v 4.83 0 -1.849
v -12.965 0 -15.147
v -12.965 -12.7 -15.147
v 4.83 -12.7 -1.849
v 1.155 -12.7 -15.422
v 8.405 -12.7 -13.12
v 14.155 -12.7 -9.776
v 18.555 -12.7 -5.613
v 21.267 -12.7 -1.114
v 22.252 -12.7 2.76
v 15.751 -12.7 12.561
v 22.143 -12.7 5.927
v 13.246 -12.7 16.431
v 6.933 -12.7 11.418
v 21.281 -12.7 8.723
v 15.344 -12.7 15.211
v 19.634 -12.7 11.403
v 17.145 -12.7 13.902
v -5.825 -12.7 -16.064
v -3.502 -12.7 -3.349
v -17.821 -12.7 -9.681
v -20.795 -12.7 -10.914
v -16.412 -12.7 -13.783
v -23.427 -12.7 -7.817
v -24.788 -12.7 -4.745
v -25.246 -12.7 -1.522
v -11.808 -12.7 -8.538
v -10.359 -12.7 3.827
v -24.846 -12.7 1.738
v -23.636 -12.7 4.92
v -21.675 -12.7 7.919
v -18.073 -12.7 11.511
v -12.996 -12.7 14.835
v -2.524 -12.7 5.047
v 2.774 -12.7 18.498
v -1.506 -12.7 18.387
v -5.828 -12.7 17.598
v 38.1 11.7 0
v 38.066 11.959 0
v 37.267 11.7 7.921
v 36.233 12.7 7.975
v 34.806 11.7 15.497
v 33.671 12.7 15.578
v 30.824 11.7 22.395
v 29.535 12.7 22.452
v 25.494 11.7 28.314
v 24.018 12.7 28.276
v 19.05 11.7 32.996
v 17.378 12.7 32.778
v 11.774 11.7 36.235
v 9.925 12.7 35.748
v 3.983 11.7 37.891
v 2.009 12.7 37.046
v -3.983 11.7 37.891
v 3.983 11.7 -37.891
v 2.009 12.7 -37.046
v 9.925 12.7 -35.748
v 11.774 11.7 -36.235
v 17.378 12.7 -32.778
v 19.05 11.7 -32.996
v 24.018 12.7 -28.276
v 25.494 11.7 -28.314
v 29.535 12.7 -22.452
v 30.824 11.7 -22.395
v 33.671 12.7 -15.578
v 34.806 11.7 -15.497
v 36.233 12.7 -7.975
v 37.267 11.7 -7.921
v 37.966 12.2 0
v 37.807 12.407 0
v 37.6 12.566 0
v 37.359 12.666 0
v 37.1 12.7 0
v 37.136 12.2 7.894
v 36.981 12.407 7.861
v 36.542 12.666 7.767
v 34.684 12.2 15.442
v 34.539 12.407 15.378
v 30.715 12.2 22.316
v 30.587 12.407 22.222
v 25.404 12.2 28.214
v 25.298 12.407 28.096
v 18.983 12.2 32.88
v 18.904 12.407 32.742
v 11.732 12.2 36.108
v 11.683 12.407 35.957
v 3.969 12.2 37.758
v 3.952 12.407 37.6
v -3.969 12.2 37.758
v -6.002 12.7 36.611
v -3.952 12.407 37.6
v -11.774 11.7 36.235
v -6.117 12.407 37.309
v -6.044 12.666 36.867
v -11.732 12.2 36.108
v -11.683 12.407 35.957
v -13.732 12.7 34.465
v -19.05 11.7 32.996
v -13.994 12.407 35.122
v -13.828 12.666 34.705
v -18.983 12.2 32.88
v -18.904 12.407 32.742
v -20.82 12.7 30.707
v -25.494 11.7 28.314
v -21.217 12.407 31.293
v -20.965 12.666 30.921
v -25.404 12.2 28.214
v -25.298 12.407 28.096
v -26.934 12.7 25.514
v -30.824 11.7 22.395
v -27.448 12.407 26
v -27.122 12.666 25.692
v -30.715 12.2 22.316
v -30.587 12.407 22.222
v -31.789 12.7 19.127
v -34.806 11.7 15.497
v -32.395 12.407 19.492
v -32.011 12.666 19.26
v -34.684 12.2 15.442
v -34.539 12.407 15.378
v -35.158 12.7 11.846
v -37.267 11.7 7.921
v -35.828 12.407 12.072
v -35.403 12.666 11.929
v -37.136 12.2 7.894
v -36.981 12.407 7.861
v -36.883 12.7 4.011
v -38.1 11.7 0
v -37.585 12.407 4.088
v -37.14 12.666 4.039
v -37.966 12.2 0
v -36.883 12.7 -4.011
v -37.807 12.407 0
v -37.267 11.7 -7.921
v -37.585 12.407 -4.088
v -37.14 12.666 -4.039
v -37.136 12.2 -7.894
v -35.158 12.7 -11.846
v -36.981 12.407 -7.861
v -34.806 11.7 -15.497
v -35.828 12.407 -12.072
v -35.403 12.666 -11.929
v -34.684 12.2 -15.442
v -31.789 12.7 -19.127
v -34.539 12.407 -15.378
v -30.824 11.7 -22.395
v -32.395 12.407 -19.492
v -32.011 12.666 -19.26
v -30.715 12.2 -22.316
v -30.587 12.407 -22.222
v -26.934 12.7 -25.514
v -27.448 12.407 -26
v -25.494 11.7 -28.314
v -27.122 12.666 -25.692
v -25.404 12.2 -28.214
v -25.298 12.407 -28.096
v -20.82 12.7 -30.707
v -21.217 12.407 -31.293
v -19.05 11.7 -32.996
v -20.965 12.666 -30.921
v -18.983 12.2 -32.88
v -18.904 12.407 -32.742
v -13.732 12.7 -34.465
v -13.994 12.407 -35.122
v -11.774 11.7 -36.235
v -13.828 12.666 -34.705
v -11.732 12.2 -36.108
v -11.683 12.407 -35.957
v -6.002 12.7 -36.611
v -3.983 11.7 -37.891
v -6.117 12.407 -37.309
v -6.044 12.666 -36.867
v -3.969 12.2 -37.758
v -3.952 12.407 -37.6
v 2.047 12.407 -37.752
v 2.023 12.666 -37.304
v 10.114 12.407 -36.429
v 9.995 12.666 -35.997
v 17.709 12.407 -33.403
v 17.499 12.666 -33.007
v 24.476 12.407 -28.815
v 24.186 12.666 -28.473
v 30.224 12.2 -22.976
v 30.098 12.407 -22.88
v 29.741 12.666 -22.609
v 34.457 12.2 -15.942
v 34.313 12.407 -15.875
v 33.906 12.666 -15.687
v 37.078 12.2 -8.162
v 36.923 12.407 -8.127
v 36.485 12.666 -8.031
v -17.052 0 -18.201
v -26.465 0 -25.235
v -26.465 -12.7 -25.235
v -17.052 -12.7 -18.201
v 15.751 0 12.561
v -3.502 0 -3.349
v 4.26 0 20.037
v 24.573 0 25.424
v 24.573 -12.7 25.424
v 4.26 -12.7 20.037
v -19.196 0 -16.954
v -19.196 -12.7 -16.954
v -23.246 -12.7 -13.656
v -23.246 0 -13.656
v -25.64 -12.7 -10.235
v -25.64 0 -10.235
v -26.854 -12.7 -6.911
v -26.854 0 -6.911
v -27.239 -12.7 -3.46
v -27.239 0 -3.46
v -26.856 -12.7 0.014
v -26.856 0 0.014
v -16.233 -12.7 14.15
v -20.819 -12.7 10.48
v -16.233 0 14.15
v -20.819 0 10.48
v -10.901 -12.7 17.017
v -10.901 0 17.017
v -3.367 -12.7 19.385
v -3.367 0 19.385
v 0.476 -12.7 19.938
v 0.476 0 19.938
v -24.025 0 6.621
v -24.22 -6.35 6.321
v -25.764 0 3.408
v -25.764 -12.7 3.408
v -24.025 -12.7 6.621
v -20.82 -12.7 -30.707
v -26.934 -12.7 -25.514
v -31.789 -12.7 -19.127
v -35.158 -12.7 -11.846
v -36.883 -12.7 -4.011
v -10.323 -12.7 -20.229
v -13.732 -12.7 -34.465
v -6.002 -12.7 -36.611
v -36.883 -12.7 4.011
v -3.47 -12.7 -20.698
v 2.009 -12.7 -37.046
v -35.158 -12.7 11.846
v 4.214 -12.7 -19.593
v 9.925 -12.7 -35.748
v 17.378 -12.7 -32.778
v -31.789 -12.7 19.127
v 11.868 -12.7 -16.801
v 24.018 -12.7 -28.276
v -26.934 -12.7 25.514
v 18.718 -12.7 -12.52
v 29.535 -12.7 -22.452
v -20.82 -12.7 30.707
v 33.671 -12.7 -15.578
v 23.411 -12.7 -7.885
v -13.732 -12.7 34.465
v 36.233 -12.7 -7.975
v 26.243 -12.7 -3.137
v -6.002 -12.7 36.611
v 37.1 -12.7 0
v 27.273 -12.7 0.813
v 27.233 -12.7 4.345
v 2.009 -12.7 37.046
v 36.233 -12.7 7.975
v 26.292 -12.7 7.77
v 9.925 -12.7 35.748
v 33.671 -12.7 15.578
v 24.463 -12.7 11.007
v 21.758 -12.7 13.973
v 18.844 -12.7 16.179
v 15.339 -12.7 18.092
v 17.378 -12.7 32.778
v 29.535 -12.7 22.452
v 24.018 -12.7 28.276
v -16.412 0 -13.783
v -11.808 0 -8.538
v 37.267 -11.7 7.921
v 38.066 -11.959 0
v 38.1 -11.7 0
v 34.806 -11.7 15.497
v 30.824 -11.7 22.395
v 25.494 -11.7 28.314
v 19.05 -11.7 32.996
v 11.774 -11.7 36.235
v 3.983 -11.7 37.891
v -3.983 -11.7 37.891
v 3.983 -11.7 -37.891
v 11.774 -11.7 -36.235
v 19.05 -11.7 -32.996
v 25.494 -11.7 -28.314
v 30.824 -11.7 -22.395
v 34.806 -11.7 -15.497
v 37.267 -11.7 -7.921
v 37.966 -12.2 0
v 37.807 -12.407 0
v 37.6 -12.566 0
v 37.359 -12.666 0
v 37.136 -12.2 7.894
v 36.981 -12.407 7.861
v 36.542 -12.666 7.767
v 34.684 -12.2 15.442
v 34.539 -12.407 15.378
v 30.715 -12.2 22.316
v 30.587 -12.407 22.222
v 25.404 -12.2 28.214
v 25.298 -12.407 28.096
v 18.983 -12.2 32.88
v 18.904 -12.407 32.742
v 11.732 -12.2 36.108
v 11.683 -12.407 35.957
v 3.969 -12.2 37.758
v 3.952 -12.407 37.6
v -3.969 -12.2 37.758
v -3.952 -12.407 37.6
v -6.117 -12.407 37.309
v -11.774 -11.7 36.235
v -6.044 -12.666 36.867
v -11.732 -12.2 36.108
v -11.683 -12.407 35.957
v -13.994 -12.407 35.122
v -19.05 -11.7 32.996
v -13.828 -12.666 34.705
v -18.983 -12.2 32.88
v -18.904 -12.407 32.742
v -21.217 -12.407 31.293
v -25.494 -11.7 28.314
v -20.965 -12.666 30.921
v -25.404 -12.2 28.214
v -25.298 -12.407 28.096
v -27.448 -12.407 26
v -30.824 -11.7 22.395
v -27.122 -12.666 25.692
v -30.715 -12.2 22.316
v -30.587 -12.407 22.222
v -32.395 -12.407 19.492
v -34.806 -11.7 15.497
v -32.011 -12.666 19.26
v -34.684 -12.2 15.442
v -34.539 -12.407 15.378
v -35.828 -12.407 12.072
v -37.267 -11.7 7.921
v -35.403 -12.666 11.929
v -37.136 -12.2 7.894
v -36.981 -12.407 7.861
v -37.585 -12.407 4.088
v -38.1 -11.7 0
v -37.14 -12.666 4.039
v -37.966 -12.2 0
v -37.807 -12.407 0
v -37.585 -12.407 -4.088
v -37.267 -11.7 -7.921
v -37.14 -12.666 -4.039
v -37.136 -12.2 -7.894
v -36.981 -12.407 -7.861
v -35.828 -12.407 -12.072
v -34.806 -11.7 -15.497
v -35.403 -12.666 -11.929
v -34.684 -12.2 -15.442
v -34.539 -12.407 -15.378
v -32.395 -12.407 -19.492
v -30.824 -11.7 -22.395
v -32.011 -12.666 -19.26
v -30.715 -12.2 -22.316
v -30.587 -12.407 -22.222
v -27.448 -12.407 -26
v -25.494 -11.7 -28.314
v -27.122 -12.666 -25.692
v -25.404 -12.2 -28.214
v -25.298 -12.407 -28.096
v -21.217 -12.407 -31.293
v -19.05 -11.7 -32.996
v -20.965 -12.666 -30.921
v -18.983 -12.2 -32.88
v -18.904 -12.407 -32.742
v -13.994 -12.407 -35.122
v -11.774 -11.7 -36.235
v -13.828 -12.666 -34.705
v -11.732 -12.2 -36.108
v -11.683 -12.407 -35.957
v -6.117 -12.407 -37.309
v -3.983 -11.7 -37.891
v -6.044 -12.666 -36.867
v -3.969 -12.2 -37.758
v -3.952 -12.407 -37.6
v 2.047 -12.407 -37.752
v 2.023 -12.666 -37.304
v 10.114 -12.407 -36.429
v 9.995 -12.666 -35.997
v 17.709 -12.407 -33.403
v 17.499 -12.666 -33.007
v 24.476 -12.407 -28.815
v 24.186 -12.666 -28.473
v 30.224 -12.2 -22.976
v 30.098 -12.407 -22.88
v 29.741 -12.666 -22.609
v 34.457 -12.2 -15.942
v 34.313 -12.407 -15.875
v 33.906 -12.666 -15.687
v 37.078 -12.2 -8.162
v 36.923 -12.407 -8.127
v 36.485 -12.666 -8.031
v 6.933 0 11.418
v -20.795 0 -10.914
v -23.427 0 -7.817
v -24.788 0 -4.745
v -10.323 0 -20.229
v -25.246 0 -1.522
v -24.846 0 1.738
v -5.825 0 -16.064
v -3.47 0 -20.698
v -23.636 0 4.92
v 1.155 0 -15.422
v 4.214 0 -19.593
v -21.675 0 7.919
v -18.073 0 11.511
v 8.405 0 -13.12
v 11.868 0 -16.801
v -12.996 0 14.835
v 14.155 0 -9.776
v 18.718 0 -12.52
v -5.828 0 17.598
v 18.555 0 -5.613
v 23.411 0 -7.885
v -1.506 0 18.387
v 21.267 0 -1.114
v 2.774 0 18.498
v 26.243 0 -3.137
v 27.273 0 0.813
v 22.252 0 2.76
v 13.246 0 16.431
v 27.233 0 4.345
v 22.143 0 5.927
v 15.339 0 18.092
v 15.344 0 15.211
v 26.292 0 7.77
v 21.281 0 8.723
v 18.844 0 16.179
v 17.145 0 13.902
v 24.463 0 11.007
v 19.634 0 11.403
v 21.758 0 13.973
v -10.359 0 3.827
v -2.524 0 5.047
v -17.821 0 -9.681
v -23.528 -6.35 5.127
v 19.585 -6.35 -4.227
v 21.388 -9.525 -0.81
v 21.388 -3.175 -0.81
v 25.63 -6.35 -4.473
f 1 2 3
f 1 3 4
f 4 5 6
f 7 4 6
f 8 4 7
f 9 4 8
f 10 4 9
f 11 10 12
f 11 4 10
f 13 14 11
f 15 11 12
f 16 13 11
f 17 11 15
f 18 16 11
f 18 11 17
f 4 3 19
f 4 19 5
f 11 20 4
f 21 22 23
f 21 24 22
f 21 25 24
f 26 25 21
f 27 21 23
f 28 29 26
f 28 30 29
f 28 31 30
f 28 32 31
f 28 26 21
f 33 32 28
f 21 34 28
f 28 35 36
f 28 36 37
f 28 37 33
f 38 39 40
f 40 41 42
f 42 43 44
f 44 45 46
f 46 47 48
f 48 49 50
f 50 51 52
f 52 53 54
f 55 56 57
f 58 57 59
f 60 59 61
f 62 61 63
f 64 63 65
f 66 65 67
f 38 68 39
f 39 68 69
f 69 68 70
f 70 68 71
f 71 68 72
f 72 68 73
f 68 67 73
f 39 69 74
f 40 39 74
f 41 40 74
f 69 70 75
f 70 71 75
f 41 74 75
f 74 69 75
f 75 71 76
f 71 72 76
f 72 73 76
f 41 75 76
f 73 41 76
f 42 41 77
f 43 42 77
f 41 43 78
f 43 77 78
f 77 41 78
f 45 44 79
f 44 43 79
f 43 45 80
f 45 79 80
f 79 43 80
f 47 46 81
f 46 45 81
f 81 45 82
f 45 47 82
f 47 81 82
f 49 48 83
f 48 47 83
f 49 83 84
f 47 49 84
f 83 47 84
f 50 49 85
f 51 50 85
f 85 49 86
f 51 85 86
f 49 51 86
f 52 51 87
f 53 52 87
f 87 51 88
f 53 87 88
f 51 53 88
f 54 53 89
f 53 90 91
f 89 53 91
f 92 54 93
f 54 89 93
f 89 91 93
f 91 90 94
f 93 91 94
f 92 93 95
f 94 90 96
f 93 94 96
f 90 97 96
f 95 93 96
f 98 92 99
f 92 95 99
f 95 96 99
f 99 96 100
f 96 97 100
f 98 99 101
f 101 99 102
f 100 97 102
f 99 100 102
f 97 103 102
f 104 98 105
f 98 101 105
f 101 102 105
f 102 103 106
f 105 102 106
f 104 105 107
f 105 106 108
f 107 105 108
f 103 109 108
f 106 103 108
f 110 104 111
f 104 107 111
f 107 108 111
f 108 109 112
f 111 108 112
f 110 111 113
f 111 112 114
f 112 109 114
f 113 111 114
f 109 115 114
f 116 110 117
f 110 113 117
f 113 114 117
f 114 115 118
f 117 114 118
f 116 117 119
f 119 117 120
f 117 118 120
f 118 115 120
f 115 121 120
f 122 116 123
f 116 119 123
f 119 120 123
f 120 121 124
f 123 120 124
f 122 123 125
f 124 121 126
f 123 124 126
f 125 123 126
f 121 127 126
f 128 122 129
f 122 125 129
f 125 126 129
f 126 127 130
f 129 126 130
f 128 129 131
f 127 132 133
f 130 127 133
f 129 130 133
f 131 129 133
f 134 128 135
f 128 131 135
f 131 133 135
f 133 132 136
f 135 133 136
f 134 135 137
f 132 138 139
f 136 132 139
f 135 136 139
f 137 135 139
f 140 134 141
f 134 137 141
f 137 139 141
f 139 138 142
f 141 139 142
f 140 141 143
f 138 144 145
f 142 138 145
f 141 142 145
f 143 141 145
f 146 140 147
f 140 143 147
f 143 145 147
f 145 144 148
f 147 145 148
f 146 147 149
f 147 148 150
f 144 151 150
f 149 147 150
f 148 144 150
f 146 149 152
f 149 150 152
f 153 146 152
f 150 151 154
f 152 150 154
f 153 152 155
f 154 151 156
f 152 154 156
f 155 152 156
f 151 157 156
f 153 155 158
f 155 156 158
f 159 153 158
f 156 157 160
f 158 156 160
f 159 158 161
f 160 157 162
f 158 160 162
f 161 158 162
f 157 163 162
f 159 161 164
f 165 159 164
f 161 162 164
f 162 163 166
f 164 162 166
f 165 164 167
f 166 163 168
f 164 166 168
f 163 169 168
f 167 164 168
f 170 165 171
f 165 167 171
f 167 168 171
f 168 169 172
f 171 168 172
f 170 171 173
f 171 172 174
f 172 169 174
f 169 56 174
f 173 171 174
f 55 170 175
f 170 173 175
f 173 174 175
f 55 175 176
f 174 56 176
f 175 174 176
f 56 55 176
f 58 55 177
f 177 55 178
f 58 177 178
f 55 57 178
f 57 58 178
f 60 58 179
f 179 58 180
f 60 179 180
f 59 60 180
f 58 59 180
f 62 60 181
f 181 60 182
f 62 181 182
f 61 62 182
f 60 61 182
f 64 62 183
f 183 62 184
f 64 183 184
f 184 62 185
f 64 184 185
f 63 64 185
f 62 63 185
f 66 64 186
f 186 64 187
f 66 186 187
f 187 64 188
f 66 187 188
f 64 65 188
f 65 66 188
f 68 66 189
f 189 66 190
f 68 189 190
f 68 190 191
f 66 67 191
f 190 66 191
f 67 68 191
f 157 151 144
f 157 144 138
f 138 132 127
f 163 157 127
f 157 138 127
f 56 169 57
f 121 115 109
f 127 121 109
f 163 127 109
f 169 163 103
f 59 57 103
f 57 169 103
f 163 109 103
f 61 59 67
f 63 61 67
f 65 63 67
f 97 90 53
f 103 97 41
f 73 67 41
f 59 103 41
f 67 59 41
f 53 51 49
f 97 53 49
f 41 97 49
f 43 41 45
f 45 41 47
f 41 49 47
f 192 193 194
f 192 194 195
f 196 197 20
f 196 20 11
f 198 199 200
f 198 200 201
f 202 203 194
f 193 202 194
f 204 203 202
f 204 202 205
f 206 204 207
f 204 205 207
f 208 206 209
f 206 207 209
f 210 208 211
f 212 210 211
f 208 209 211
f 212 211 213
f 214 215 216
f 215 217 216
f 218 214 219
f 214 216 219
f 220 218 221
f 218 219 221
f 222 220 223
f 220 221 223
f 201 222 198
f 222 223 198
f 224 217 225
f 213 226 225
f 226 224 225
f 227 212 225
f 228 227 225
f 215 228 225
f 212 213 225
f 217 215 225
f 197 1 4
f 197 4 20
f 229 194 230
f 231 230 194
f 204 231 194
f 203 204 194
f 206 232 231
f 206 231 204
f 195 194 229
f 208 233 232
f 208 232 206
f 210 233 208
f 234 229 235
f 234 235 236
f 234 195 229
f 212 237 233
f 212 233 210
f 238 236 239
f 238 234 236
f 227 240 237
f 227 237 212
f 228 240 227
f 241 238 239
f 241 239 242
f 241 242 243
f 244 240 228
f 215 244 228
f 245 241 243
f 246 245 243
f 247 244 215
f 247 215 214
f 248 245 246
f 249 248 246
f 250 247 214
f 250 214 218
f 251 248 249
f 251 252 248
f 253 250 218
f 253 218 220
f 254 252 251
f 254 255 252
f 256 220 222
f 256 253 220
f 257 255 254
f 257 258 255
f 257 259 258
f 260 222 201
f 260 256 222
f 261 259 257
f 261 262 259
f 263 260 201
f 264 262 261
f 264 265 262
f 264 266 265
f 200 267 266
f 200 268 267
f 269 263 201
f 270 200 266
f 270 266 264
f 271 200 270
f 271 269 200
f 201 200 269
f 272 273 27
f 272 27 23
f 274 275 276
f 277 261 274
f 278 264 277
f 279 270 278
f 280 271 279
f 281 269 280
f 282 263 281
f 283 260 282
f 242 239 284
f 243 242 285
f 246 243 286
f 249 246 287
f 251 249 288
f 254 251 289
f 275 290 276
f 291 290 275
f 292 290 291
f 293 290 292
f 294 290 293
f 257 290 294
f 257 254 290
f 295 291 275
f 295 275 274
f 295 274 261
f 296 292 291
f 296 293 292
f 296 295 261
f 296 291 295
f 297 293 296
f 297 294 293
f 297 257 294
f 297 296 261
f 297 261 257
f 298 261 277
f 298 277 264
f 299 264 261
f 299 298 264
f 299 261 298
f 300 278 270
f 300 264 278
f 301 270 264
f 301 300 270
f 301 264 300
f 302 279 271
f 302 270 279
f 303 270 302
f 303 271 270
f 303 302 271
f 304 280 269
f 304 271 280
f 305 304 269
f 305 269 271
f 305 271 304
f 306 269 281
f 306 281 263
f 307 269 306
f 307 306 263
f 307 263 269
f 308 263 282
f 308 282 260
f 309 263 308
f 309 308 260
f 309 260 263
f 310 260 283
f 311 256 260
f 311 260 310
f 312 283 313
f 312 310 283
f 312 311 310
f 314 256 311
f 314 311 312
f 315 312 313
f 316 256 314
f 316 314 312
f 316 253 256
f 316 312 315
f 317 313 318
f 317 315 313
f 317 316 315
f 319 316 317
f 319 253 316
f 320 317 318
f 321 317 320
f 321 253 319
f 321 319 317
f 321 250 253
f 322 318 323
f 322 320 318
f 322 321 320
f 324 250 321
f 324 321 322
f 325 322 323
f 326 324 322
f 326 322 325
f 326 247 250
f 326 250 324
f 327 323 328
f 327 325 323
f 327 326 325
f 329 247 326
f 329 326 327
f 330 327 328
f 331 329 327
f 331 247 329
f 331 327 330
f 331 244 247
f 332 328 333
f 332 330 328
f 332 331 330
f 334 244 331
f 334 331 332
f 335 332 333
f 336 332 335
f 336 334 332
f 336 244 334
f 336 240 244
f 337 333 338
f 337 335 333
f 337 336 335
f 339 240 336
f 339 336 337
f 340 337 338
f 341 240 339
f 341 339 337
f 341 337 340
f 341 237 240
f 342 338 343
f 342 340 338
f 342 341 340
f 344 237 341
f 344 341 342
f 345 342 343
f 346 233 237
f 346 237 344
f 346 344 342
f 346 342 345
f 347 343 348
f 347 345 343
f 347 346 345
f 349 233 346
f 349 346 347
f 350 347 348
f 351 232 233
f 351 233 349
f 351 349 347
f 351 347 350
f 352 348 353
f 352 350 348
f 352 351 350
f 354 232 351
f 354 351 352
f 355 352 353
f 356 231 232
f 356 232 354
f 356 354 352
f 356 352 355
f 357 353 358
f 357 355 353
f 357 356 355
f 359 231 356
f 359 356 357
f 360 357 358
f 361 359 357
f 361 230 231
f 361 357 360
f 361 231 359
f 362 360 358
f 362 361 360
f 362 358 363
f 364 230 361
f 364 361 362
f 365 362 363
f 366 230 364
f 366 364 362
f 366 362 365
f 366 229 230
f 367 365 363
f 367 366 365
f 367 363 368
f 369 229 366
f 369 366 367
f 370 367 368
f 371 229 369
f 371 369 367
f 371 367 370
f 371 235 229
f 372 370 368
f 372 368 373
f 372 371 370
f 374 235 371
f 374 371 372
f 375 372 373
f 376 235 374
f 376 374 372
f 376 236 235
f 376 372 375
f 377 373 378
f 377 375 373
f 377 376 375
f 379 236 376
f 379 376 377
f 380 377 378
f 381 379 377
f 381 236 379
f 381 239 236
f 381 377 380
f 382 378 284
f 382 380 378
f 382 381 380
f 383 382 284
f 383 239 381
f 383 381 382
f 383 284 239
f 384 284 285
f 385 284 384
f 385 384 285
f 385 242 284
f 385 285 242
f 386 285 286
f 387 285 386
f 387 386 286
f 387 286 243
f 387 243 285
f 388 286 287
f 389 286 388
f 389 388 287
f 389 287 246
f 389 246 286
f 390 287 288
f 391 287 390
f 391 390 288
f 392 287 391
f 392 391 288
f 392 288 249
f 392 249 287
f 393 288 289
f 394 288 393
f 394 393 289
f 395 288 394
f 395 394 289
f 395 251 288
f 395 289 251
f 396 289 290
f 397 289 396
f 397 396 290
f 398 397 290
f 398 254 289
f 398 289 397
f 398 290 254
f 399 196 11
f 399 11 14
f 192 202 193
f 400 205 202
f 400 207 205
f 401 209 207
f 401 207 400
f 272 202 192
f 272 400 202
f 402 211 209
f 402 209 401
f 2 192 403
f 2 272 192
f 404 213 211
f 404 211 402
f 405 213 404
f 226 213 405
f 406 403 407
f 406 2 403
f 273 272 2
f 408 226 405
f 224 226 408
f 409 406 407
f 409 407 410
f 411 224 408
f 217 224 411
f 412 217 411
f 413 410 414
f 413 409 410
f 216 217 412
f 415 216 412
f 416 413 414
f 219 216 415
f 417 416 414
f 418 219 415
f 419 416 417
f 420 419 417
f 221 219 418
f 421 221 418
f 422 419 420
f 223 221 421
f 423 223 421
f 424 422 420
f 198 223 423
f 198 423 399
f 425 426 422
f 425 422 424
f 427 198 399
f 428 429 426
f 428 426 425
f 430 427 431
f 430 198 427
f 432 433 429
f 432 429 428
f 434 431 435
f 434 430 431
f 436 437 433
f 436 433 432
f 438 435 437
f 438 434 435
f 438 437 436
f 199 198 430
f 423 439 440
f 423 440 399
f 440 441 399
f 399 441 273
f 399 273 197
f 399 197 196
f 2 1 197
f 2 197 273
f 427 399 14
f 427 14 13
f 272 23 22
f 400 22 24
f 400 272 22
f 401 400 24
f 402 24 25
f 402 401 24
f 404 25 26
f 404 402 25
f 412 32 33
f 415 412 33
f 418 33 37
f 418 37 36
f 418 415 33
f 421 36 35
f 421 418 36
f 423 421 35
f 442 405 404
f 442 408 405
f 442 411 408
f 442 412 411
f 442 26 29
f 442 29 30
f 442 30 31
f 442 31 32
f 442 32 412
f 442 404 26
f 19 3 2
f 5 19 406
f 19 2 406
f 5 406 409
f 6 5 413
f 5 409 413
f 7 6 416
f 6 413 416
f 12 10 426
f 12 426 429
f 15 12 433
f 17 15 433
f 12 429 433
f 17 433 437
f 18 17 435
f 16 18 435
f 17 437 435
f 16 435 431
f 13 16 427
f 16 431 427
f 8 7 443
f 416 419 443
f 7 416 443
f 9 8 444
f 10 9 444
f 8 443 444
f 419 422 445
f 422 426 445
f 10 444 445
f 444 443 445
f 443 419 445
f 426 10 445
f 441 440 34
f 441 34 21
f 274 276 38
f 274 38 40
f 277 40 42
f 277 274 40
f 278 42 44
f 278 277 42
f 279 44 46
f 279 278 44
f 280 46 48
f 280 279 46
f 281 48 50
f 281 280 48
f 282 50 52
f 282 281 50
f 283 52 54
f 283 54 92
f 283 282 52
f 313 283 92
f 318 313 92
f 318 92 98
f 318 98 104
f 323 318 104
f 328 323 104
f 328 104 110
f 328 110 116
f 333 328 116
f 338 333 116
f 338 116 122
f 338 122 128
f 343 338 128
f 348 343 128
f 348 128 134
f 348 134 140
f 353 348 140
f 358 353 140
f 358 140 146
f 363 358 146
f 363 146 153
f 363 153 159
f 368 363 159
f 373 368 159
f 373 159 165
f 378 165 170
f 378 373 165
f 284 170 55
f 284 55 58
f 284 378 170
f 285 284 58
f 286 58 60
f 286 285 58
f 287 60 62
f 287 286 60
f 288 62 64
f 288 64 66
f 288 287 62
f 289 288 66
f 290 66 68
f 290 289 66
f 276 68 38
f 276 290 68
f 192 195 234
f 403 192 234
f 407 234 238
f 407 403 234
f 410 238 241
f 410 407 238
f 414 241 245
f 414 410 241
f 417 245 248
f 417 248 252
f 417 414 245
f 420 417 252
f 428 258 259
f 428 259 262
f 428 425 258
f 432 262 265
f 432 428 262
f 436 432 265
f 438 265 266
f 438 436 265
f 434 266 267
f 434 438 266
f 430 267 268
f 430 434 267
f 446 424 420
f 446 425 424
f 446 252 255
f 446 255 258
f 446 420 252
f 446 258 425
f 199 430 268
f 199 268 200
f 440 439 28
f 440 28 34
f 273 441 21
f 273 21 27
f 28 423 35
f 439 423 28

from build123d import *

# Parameters (mm, degrees)
F3_R     = 38.1
F4_DEPTH = 12.7
F5_DEPTH = 12.7
F6_R     = 1


with BuildPart() as f4:
    # F3 (on Front) → F4 (new body, symmetric)
    with BuildSketch(Plane.XZ):
        Circle(F3_R)
    extrude(amount=F4_DEPTH, both=True)

    # F0 (on Front) + F1 (on Front) + F2 (on Front) → F5 (cut)
    with BuildSketch(Plane.XZ):
        Polygon((-11.8081336841, -8.5378140211), (-26.464993082, -25.2349018068), (4.8301340017, -1.8485224727), (-3.5016993061, -3.3492420334), (15.7506130636, 12.5613436103), (6.9332248531, 11.4183481783), (24.5728250593, 25.4238694906), (4.1189347394, 19.9994817376), (-10.358533822, 3.8266193587), (-2.5237547234, 5.047195591), (-17.8205184639, -9.6808085218), align=None)
    with BuildSketch(Plane.XZ):
        with BuildLine():
            Line((-19.0900918096, -17.018487677), (-16.3832232356, -13.7969218194))
            add(Edge.make_bspline(
                [(-16.3832232356, -13.7969218194), (-25.3736051563, -9.473731392), (-29.0905786368, 8.1572549104), (-7.3840054694, 19.1332485124), (2.8318234254, 18.4940695763)],
                knots=[0, 0, 0, 0, 0.4527371046, 1, 1, 1, 1], degree=3))
            Line((2.8318234254, 18.4940695763), (4.588526208, 20.0228095055))
            add(Edge.make_bspline(
                [(-19.0900918096, -17.018487677), (-28.620544821, -11.2098539248), (-29.5136057934, 10.2947418894), (-6.1136707664, 20.5405261368), (4.588526208, 20.0228095055)],
                knots=[0, 0, 0, 0, 0.4639479817, 1, 1, 1, 1], degree=3))
        make_face()
    with BuildSketch(Plane.XZ):
        with BuildLine():
            add(Edge.make_bspline(
                [(-13.784956187, -14.9299576879), (-0.5538631669, -18.623918621), (24.9938380842, -8.3206427927), (23.5522668809, 11.1457686871), (13.0951637402, 16.5083874017)],
                knots=[0, 0, 0, 0, 0.5594726936, 1, 1, 1, 1], degree=3))
            Line((-13.784956187, -14.9299576879), (-17.4717549235, -18.0134642869))
            add(Edge.make_bspline(
                [(-17.4717549235, -18.0134642869), (-0.7163750913, -25.6539166477), (35.1580871339, -8.4938520858), (26.0995104909, 13.357847929), (14.8380147293, 18.3182712644)],
                knots=[0, 0, 0, 0, 0.5723759264, 1, 1, 1, 1], degree=3))
            Line((14.8380147293, 18.3182712644), (13.0951637402, 16.5083874017))
        make_face()
    extrude(amount=F5_DEPTH, mode=Mode.SUBTRACT)

    # F6
    f6_edges = [f4.edges().sort_by_distance(p)[0] for p in [
        (-38.1, -12.7, 0),
        (-38.1, 12.7, 0),
    ]]
    fillet(f6_edges, radius=F6_R)


solid = f4.part
